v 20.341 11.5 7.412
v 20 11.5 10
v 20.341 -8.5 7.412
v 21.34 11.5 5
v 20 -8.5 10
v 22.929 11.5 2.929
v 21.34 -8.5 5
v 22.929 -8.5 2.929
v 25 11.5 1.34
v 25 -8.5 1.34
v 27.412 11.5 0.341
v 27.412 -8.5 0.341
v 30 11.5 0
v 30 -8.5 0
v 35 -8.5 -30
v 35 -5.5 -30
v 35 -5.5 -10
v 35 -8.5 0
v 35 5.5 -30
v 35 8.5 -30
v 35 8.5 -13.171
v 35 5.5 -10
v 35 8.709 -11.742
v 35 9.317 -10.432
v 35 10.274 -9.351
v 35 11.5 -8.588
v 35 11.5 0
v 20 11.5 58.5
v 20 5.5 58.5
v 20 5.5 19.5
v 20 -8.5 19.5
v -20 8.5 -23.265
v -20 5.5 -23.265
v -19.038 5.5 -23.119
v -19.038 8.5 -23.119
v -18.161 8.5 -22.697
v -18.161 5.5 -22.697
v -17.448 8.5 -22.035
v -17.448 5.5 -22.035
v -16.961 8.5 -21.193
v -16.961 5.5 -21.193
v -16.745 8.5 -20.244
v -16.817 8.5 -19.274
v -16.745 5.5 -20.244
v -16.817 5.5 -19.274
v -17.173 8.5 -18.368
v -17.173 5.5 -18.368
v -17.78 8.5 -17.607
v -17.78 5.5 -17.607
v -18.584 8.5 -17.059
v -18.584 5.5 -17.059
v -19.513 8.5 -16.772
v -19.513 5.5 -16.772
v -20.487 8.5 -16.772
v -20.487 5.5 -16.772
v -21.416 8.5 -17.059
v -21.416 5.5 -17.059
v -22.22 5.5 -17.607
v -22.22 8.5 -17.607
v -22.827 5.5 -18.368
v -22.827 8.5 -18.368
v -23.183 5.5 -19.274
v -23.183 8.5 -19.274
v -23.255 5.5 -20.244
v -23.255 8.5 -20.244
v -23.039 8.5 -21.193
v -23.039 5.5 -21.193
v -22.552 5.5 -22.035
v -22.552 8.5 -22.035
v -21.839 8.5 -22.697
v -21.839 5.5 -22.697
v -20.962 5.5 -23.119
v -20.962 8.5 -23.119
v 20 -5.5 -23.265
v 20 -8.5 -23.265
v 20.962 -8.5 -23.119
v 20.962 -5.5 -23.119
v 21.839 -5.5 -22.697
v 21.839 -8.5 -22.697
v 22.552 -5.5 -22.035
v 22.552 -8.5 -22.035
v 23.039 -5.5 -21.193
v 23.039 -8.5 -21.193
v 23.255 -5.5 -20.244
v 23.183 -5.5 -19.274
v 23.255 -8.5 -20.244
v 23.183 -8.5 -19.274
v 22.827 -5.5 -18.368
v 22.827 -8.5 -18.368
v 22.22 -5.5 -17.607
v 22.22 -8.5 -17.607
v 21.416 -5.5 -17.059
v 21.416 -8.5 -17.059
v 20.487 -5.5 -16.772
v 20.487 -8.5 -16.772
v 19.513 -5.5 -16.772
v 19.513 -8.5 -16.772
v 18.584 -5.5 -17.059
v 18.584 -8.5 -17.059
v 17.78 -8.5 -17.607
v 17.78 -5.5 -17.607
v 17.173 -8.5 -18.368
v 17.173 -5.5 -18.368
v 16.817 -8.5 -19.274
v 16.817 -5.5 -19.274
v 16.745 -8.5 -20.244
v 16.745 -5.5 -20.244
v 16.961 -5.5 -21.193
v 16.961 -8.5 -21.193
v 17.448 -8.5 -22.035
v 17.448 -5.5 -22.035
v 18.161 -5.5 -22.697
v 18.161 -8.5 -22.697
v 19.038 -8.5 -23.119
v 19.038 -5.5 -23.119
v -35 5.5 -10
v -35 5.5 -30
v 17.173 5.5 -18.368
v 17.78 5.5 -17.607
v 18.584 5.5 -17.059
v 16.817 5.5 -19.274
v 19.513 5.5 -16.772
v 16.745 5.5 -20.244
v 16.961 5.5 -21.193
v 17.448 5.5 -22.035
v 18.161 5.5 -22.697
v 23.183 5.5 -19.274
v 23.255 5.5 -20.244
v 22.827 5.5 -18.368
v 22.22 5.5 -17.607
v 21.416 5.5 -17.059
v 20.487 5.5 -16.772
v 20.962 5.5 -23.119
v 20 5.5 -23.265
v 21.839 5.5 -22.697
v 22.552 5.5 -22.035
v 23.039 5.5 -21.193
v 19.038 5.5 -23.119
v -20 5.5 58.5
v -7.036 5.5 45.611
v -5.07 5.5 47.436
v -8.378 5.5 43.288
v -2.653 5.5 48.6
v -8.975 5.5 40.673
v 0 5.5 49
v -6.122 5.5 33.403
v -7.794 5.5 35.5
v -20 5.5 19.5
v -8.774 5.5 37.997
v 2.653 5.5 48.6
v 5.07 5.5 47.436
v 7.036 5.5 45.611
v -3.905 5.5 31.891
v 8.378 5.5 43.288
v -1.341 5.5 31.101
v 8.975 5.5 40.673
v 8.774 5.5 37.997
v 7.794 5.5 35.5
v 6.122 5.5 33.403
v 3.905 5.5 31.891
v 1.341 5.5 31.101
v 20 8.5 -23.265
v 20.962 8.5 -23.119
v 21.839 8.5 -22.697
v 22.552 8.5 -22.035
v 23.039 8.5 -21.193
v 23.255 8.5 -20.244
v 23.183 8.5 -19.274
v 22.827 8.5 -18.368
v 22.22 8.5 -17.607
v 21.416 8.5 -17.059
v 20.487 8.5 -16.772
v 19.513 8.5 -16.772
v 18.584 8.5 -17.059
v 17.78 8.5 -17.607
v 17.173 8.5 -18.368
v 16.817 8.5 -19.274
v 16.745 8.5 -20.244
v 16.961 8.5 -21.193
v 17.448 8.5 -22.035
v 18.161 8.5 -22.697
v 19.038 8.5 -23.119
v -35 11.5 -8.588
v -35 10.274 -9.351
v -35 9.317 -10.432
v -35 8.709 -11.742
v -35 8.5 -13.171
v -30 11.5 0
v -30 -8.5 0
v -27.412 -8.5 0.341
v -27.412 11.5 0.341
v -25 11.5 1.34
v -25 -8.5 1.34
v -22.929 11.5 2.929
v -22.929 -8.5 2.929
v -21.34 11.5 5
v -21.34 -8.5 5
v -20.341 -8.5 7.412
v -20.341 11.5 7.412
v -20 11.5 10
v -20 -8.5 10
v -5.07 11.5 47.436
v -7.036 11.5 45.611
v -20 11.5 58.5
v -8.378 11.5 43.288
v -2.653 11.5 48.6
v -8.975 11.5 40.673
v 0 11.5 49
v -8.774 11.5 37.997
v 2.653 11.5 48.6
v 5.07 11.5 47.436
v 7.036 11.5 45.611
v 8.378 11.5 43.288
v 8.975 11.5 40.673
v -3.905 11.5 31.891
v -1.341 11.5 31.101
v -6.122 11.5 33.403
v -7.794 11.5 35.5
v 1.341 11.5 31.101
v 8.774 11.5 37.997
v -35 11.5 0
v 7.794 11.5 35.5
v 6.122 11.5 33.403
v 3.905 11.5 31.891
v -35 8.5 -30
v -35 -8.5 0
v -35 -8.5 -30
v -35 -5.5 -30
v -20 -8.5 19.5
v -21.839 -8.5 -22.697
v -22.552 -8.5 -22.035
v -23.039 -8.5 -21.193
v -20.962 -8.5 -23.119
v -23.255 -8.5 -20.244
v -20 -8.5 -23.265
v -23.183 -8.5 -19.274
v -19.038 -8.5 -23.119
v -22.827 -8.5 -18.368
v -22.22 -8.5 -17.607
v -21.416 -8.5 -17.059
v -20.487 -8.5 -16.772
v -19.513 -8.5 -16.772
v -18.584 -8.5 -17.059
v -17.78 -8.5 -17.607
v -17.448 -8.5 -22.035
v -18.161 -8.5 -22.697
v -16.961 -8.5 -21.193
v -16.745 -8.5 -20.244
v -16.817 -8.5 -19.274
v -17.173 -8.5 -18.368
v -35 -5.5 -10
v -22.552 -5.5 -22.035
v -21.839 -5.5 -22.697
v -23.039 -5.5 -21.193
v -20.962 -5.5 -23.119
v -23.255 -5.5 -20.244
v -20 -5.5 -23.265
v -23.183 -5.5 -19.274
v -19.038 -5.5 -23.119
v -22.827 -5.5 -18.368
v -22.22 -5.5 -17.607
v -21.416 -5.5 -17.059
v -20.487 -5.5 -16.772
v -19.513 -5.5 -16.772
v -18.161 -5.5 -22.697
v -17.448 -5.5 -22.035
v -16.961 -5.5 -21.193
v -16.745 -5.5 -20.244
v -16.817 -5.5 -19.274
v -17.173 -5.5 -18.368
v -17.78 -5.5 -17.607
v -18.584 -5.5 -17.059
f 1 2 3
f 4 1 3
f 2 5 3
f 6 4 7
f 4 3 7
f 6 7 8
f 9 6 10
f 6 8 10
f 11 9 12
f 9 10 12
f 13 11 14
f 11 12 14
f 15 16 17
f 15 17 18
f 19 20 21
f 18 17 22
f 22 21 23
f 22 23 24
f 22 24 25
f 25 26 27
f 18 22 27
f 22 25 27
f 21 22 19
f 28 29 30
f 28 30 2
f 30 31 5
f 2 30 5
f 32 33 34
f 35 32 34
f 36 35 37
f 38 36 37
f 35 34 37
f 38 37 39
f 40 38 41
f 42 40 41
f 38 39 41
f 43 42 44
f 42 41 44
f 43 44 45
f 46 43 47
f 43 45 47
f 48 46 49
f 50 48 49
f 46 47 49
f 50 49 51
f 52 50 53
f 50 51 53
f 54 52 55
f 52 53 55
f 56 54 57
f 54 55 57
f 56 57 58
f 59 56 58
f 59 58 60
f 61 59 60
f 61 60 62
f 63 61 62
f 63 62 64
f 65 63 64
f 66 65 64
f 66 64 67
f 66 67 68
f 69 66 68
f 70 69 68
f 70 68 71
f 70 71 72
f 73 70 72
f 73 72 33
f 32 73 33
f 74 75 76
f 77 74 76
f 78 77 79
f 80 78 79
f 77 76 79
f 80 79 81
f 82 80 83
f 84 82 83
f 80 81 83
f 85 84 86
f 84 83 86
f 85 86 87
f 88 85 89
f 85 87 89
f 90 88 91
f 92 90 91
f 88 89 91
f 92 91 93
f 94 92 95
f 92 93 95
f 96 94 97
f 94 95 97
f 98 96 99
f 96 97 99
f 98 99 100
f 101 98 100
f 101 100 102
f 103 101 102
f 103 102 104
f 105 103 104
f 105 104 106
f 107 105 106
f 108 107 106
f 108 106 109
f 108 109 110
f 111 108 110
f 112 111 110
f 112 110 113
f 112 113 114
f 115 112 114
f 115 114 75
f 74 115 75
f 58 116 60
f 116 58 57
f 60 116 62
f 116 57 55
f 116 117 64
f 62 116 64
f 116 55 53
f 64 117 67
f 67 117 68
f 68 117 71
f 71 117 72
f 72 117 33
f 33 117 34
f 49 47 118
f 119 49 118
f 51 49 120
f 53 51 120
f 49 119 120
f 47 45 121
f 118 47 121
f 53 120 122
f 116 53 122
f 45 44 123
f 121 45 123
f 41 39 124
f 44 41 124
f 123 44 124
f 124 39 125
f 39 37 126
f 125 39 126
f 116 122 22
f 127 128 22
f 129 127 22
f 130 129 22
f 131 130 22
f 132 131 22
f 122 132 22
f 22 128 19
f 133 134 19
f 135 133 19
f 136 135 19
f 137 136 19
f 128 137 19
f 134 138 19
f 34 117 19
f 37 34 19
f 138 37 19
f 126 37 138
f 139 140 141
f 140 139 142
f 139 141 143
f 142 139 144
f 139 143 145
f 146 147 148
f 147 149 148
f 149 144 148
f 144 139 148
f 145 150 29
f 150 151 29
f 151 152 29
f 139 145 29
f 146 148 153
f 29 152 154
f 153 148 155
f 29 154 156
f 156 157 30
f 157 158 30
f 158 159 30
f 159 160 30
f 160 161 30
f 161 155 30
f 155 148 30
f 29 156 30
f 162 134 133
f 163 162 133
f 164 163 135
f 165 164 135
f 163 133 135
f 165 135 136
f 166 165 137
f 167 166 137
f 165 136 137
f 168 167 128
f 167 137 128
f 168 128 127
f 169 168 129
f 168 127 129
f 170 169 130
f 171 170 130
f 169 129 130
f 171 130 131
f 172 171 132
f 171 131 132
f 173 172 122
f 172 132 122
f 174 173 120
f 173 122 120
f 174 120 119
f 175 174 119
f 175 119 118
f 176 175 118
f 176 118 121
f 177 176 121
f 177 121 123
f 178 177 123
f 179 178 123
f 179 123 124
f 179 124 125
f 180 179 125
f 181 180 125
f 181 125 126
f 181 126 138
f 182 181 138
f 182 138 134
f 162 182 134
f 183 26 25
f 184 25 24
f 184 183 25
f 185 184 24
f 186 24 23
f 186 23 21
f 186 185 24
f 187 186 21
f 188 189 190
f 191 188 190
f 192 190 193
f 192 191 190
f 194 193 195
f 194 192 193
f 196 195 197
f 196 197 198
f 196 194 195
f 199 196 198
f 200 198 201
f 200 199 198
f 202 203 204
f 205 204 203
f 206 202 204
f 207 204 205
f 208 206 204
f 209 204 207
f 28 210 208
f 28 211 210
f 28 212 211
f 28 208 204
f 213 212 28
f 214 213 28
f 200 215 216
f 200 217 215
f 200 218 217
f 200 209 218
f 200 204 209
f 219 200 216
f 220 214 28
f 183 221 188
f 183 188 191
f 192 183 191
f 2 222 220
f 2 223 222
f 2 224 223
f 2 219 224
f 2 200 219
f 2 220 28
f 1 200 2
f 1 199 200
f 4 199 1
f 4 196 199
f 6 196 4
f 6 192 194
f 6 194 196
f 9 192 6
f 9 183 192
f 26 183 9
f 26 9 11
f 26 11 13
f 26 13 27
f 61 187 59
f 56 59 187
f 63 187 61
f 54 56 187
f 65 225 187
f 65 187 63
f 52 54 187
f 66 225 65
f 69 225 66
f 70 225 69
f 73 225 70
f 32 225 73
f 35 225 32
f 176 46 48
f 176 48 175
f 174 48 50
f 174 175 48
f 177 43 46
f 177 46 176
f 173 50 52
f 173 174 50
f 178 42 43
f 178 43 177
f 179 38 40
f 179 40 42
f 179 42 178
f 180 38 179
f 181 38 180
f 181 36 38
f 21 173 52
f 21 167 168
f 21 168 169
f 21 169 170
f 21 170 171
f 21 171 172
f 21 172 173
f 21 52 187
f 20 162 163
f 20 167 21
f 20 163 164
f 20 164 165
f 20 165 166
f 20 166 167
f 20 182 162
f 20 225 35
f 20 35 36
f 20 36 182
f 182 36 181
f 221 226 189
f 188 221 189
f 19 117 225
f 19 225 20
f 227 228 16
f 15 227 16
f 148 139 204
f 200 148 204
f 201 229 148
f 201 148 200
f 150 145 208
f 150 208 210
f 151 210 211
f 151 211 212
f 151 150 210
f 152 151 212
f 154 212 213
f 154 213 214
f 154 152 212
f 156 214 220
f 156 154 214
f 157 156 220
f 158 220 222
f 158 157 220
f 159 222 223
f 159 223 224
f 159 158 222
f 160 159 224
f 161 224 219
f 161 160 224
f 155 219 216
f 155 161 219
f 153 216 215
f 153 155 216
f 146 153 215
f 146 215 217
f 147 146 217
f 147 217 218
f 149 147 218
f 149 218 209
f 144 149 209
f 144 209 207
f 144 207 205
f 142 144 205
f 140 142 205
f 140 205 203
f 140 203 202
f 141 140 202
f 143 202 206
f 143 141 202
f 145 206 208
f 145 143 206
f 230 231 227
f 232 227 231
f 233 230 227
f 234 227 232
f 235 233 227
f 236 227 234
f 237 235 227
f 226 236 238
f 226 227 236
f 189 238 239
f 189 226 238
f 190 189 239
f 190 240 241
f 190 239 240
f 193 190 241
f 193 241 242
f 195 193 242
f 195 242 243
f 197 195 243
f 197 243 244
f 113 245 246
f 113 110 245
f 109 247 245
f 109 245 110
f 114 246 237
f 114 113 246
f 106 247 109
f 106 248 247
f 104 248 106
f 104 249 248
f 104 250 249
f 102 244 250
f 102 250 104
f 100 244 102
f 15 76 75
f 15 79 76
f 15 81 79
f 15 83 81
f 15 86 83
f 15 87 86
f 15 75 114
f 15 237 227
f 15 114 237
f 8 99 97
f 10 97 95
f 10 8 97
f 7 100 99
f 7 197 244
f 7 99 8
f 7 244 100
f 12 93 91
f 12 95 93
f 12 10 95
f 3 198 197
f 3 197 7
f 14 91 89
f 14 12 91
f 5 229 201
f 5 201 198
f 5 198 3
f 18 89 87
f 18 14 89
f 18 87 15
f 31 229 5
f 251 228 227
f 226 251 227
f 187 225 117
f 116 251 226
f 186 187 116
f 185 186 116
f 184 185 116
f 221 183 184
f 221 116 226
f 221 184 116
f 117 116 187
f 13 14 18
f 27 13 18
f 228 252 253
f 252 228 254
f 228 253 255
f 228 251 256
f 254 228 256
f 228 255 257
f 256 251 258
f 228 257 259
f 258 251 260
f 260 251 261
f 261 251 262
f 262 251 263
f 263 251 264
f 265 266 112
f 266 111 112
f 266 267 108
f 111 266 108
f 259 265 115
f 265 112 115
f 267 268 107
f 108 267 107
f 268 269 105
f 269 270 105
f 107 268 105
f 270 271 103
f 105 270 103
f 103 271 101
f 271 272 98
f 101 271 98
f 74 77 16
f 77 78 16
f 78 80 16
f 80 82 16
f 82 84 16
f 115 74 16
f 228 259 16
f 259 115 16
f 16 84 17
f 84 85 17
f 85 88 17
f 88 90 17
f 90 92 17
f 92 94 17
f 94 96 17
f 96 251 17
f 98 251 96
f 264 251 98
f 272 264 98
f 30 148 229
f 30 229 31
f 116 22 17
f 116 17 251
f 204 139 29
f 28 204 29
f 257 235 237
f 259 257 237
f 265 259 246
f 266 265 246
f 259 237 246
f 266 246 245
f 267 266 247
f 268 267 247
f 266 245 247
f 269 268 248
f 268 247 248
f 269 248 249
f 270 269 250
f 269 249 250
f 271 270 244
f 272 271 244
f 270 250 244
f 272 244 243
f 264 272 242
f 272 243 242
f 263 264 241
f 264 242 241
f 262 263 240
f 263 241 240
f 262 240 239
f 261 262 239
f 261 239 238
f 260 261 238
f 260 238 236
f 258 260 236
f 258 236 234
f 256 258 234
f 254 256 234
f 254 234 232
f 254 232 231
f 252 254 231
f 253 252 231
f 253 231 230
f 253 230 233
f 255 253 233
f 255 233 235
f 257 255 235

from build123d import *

# Parameters (mm, degrees)
SKETCH1_W                = 40
SKETCH1_H                = 11
BOSS_EXTRUDE1_DEPTH      = 19.5
SKETCH2_W                = 70
SKETCH2_H                = 11
BOSS_EXTRUDE2_DEPTH      = 10
SKETCH3_W                = 70
SKETCH3_H                = 20
SKETCH3_W_2              = 40
SKETCH3_H_2              = 19.5
BOSS_EXTRUDE4_DEPTH      = 3
SKETCH4_W                = 70
SKETCH4_H                = 30
SKETCH4_W_2              = 40
SKETCH4_H_2              = 19.5
BOSS_EXTRUDE5_DEPTH      = 3
SKETCH5_R                = 3.264523149
CUT_EXTRUDE1_DEPTH       = 50.132473986
BOSS_EXTRUDE6_DEPTH      = 3
BOSS_EXTRUDE6_DEPTH_BACK = 3
SKETCH6_W                = 40
SKETCH6_H                = 19.5
SKETCH6_H_2              = 39
SKETCH6_R                = 9
FILLET1_R                = 5
FILLET2_R                = 10


with BuildPart() as part:
    # Sketch1 → Boss-Extrude1 (new body)
    with BuildSketch(Plane.XY):
        Rectangle(SKETCH1_W, SKETCH1_H)
    extrude(amount=BOSS_EXTRUDE1_DEPTH)

    # Sketch2 → Boss-Extrude2 (add)
    with BuildSketch(Plane(origin=(0, 0, 0), x_dir=(-1, 0, 0), z_dir=(0, 0, -1))):
        Rectangle(SKETCH2_W, SKETCH2_H)
    extrude(amount=BOSS_EXTRUDE2_DEPTH)

    # Sketch3 → Boss-Extrude4 (add)
    with BuildSketch(Plane(origin=(0, 5.5, 0), x_dir=(1, 0, 0), z_dir=(0, 1, 0))):
        with Locations((0, 20)):
            Rectangle(SKETCH3_W, SKETCH3_H)
        Polygon((-35, 10), (-35, 0), (-20, 0), (20, 0), (35, 0), (35, 10), align=None)
        with Locations((0, -9.75)):
            Rectangle(SKETCH3_W_2, SKETCH3_H_2)
    extrude(amount=BOSS_EXTRUDE4_DEPTH)

    # Sketch4 → Boss-Extrude5 (add)
    with BuildSketch(Plane.XZ.offset(5.5)):
        with Locations((0, -15)):
            Rectangle(SKETCH4_W, SKETCH4_H)
        with Locations((0, 9.75)):
            Rectangle(SKETCH4_W_2, SKETCH4_H_2)
    extrude(amount=BOSS_EXTRUDE5_DEPTH)

    # Sketch5 → Cut-Extrude1 (cut, through all)
    with BuildSketch(Plane.XZ.offset(8.5)):
        with Locations(Location((-20, -20, 0), (0, 0, 270))):
            Circle(SKETCH5_R)
        with Locations(Location((20, -20, 0), (0, 0, 270))):
            Circle(SKETCH5_R)
    extrude(amount=-CUT_EXTRUDE1_DEPTH, mode=Mode.SUBTRACT)

    # Sketch6 → Boss-Extrude6 (add, two sides: drawn at the far end of the back side and taken through both)
    # profile 1 of 3: a face of its own
    with BuildSketch(Plane(origin=(0, 8.5, 0), x_dir=(1, 0, 0), z_dir=(0, 1, 0)).offset(-BOSS_EXTRUDE6_DEPTH_BACK)):
        Polygon((-20, 0), (20, 0), (35, 0), (35, 8.588079042), (-35, 8.588079042), (-35, 0), align=None)
    # profile 2 of 3: a face of its own
    with BuildSketch(Plane(origin=(0, 8.5, 0), x_dir=(1, 0, 0), z_dir=(0, 1, 0)).offset(-BOSS_EXTRUDE6_DEPTH_BACK)):
        with Locations((0, -9.75)):
            Rectangle(SKETCH6_W, SKETCH6_H)
    # profile 3 of 3: a face of its own
    with BuildSketch(Plane(origin=(0, 8.5, 0), x_dir=(1, 0, 0), z_dir=(0, 1, 0)).offset(-BOSS_EXTRUDE6_DEPTH_BACK)):
        with Locations((0, -39)):
            Rectangle(SKETCH6_W, SKETCH6_H_2)
        with Locations(Location((0, -40, 0), (0, 0, 270))):
            Circle(SKETCH6_R, mode=Mode.SUBTRACT)
    extrude(amount=BOSS_EXTRUDE6_DEPTH + BOSS_EXTRUDE6_DEPTH_BACK)

    # Fillet1
    # the kernel refuses this fillet: 5 mm, written as the material it adds along each edge
    with BuildSketch(Plane(origin=(-35, 8.5, -8.588079042), x_dir=(0, 0, -1), z_dir=(1, 0, 0))) as fillet1_piece_1:
        with BuildLine():
            CenterArc((4.582575695, 5), FILLET1_R, 203.578178478, 66.421821522)
            Line((0, 3), (-0.091651514, 2.96))
            ThreePointArc((-0.091651514, 2.96), (-0.1, 1.5), (-0.1, 0))
            Line((-0.1, 0), (0, -0.1))
            Line((0, -0.1), (4.582575695, -0.1))
            Line((4.582575695, -0.1), (4.582575695, 0))
        make_face()
    extrude(amount=70)

    # Fillet2
    fillet2_edges = [part.edges().sort_by_distance(p)[0] for p in [
        (-20, 1.5, 0),
        (20, 1.5, 0),
    ]]
    fillet(fillet2_edges, radius=FILLET2_R)


solid = part.part
